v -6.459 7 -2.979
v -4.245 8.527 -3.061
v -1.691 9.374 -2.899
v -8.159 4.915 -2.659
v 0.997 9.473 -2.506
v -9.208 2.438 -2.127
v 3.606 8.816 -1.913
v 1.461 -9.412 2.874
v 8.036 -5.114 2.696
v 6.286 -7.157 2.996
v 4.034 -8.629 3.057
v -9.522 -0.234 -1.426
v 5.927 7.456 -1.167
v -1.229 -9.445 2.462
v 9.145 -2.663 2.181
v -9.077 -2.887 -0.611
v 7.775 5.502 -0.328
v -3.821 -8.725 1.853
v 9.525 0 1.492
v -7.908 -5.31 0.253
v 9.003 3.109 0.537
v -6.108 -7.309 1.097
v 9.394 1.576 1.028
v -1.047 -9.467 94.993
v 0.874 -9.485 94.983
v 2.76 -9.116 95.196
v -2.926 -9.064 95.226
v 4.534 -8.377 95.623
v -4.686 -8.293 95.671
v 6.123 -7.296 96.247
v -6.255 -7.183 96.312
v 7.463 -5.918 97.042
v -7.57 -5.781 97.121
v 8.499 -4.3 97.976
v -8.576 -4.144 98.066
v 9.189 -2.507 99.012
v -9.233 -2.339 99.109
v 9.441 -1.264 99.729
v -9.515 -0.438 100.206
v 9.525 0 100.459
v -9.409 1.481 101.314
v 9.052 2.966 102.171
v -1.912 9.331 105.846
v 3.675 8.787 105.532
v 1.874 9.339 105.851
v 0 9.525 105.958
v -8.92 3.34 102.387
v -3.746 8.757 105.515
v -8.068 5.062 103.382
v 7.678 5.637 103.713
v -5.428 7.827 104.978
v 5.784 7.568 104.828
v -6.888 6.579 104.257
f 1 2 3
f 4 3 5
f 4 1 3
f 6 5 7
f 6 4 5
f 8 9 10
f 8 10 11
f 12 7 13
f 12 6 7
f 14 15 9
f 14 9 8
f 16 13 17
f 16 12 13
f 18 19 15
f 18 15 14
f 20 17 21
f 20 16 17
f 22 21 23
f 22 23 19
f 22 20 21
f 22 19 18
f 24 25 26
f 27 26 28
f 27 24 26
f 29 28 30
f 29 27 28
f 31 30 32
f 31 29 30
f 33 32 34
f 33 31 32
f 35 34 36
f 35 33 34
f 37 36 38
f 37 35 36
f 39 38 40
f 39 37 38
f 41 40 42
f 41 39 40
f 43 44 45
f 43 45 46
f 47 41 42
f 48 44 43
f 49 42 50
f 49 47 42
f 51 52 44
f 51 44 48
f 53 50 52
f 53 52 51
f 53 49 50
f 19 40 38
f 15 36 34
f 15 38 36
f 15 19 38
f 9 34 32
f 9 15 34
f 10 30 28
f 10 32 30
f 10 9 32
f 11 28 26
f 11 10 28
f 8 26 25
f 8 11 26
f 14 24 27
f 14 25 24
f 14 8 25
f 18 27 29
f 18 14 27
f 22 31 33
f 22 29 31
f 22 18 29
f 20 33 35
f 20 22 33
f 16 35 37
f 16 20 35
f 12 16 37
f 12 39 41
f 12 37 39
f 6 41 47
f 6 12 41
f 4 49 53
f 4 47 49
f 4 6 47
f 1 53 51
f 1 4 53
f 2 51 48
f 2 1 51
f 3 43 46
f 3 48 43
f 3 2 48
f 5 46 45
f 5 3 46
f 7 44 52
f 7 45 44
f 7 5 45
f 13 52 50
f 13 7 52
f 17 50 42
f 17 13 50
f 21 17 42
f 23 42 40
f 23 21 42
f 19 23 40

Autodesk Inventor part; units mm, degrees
ref_plane "Start Plane" through (0, 0, -4.1685) normal (0, 0, 1) x (1, 0, 0)
ref_plane "End Plane" through (0, 0, 105.9582) normal (0, 0, 1) x (1, 0, 0)
sketch "Sketch" plane through (0, 0, 0) normal (0, 0, 1) x (1, 0, 0)
  circle A0 centre (0, 0) radius 9.525
  dimension "d0" = 19.05
extrude "Body" add sketch "Sketch" along normal up to surface (110.1267 mm away) from surface at -4.1685
sketch "Sketch2" plane through (0, 0, 0) normal (0, 0, 1) x (1, 0, 0)
  line L0 (0, 0) -> (10, 0)
ref_plane "Work Plane3" through (0, 0, 0) normal (0, -1, 0) x (1, 0, 0)
ref_plane "Work Plane4" through (0, 9.525, 105.9582) normal (0, -0.5, 0.866) x (1, 0, 0)
split "Split1" plane through (0, 9.525, 105.9582) removes the side toward (0, -0.5, 0.866)
ref_plane "Work Plane5" through (-4.6367, 8.3203, -3.0644) normal (0.1491, -0.2675, -0.9519) x (0.5375, 0.83, -0.1491)
split "Split2" plane through (-4.6367, 8.3203, -3.0644) removes the side toward (0.1491, -0.2675, -0.9519)
sketch "Sketch3" plane through (0, 0, 0) normal (0, -1, 0) x (1, 0, 0)
  line L0 (-2, -4.1685) -> (12, -4.1685) projected
  line L1 (-2, 105.9582) -> (12, 105.9582) projected
  dimension "d7" = 110.1267
equation "\"d0\" = Diam"
equation "\"d1\" = G_L"
equation "\"Diam\" = 19.05"
equation "\"G_L\" = 109.02261"
equation "\"G_OFFSET_START\" = 4.16853"
equation "\"G_OFFSET_END\" = 5.49926"
equation "\"d4\" = -G_OFFSET_START"
equation "\"d5\" = G_OFFSET_END + B_L"
equation "\"B_L\" = 100.45895"
properties part number "ANSI/AISC Rolled Steel - 3/4-4.292, RB" material "Steel, Mild"
